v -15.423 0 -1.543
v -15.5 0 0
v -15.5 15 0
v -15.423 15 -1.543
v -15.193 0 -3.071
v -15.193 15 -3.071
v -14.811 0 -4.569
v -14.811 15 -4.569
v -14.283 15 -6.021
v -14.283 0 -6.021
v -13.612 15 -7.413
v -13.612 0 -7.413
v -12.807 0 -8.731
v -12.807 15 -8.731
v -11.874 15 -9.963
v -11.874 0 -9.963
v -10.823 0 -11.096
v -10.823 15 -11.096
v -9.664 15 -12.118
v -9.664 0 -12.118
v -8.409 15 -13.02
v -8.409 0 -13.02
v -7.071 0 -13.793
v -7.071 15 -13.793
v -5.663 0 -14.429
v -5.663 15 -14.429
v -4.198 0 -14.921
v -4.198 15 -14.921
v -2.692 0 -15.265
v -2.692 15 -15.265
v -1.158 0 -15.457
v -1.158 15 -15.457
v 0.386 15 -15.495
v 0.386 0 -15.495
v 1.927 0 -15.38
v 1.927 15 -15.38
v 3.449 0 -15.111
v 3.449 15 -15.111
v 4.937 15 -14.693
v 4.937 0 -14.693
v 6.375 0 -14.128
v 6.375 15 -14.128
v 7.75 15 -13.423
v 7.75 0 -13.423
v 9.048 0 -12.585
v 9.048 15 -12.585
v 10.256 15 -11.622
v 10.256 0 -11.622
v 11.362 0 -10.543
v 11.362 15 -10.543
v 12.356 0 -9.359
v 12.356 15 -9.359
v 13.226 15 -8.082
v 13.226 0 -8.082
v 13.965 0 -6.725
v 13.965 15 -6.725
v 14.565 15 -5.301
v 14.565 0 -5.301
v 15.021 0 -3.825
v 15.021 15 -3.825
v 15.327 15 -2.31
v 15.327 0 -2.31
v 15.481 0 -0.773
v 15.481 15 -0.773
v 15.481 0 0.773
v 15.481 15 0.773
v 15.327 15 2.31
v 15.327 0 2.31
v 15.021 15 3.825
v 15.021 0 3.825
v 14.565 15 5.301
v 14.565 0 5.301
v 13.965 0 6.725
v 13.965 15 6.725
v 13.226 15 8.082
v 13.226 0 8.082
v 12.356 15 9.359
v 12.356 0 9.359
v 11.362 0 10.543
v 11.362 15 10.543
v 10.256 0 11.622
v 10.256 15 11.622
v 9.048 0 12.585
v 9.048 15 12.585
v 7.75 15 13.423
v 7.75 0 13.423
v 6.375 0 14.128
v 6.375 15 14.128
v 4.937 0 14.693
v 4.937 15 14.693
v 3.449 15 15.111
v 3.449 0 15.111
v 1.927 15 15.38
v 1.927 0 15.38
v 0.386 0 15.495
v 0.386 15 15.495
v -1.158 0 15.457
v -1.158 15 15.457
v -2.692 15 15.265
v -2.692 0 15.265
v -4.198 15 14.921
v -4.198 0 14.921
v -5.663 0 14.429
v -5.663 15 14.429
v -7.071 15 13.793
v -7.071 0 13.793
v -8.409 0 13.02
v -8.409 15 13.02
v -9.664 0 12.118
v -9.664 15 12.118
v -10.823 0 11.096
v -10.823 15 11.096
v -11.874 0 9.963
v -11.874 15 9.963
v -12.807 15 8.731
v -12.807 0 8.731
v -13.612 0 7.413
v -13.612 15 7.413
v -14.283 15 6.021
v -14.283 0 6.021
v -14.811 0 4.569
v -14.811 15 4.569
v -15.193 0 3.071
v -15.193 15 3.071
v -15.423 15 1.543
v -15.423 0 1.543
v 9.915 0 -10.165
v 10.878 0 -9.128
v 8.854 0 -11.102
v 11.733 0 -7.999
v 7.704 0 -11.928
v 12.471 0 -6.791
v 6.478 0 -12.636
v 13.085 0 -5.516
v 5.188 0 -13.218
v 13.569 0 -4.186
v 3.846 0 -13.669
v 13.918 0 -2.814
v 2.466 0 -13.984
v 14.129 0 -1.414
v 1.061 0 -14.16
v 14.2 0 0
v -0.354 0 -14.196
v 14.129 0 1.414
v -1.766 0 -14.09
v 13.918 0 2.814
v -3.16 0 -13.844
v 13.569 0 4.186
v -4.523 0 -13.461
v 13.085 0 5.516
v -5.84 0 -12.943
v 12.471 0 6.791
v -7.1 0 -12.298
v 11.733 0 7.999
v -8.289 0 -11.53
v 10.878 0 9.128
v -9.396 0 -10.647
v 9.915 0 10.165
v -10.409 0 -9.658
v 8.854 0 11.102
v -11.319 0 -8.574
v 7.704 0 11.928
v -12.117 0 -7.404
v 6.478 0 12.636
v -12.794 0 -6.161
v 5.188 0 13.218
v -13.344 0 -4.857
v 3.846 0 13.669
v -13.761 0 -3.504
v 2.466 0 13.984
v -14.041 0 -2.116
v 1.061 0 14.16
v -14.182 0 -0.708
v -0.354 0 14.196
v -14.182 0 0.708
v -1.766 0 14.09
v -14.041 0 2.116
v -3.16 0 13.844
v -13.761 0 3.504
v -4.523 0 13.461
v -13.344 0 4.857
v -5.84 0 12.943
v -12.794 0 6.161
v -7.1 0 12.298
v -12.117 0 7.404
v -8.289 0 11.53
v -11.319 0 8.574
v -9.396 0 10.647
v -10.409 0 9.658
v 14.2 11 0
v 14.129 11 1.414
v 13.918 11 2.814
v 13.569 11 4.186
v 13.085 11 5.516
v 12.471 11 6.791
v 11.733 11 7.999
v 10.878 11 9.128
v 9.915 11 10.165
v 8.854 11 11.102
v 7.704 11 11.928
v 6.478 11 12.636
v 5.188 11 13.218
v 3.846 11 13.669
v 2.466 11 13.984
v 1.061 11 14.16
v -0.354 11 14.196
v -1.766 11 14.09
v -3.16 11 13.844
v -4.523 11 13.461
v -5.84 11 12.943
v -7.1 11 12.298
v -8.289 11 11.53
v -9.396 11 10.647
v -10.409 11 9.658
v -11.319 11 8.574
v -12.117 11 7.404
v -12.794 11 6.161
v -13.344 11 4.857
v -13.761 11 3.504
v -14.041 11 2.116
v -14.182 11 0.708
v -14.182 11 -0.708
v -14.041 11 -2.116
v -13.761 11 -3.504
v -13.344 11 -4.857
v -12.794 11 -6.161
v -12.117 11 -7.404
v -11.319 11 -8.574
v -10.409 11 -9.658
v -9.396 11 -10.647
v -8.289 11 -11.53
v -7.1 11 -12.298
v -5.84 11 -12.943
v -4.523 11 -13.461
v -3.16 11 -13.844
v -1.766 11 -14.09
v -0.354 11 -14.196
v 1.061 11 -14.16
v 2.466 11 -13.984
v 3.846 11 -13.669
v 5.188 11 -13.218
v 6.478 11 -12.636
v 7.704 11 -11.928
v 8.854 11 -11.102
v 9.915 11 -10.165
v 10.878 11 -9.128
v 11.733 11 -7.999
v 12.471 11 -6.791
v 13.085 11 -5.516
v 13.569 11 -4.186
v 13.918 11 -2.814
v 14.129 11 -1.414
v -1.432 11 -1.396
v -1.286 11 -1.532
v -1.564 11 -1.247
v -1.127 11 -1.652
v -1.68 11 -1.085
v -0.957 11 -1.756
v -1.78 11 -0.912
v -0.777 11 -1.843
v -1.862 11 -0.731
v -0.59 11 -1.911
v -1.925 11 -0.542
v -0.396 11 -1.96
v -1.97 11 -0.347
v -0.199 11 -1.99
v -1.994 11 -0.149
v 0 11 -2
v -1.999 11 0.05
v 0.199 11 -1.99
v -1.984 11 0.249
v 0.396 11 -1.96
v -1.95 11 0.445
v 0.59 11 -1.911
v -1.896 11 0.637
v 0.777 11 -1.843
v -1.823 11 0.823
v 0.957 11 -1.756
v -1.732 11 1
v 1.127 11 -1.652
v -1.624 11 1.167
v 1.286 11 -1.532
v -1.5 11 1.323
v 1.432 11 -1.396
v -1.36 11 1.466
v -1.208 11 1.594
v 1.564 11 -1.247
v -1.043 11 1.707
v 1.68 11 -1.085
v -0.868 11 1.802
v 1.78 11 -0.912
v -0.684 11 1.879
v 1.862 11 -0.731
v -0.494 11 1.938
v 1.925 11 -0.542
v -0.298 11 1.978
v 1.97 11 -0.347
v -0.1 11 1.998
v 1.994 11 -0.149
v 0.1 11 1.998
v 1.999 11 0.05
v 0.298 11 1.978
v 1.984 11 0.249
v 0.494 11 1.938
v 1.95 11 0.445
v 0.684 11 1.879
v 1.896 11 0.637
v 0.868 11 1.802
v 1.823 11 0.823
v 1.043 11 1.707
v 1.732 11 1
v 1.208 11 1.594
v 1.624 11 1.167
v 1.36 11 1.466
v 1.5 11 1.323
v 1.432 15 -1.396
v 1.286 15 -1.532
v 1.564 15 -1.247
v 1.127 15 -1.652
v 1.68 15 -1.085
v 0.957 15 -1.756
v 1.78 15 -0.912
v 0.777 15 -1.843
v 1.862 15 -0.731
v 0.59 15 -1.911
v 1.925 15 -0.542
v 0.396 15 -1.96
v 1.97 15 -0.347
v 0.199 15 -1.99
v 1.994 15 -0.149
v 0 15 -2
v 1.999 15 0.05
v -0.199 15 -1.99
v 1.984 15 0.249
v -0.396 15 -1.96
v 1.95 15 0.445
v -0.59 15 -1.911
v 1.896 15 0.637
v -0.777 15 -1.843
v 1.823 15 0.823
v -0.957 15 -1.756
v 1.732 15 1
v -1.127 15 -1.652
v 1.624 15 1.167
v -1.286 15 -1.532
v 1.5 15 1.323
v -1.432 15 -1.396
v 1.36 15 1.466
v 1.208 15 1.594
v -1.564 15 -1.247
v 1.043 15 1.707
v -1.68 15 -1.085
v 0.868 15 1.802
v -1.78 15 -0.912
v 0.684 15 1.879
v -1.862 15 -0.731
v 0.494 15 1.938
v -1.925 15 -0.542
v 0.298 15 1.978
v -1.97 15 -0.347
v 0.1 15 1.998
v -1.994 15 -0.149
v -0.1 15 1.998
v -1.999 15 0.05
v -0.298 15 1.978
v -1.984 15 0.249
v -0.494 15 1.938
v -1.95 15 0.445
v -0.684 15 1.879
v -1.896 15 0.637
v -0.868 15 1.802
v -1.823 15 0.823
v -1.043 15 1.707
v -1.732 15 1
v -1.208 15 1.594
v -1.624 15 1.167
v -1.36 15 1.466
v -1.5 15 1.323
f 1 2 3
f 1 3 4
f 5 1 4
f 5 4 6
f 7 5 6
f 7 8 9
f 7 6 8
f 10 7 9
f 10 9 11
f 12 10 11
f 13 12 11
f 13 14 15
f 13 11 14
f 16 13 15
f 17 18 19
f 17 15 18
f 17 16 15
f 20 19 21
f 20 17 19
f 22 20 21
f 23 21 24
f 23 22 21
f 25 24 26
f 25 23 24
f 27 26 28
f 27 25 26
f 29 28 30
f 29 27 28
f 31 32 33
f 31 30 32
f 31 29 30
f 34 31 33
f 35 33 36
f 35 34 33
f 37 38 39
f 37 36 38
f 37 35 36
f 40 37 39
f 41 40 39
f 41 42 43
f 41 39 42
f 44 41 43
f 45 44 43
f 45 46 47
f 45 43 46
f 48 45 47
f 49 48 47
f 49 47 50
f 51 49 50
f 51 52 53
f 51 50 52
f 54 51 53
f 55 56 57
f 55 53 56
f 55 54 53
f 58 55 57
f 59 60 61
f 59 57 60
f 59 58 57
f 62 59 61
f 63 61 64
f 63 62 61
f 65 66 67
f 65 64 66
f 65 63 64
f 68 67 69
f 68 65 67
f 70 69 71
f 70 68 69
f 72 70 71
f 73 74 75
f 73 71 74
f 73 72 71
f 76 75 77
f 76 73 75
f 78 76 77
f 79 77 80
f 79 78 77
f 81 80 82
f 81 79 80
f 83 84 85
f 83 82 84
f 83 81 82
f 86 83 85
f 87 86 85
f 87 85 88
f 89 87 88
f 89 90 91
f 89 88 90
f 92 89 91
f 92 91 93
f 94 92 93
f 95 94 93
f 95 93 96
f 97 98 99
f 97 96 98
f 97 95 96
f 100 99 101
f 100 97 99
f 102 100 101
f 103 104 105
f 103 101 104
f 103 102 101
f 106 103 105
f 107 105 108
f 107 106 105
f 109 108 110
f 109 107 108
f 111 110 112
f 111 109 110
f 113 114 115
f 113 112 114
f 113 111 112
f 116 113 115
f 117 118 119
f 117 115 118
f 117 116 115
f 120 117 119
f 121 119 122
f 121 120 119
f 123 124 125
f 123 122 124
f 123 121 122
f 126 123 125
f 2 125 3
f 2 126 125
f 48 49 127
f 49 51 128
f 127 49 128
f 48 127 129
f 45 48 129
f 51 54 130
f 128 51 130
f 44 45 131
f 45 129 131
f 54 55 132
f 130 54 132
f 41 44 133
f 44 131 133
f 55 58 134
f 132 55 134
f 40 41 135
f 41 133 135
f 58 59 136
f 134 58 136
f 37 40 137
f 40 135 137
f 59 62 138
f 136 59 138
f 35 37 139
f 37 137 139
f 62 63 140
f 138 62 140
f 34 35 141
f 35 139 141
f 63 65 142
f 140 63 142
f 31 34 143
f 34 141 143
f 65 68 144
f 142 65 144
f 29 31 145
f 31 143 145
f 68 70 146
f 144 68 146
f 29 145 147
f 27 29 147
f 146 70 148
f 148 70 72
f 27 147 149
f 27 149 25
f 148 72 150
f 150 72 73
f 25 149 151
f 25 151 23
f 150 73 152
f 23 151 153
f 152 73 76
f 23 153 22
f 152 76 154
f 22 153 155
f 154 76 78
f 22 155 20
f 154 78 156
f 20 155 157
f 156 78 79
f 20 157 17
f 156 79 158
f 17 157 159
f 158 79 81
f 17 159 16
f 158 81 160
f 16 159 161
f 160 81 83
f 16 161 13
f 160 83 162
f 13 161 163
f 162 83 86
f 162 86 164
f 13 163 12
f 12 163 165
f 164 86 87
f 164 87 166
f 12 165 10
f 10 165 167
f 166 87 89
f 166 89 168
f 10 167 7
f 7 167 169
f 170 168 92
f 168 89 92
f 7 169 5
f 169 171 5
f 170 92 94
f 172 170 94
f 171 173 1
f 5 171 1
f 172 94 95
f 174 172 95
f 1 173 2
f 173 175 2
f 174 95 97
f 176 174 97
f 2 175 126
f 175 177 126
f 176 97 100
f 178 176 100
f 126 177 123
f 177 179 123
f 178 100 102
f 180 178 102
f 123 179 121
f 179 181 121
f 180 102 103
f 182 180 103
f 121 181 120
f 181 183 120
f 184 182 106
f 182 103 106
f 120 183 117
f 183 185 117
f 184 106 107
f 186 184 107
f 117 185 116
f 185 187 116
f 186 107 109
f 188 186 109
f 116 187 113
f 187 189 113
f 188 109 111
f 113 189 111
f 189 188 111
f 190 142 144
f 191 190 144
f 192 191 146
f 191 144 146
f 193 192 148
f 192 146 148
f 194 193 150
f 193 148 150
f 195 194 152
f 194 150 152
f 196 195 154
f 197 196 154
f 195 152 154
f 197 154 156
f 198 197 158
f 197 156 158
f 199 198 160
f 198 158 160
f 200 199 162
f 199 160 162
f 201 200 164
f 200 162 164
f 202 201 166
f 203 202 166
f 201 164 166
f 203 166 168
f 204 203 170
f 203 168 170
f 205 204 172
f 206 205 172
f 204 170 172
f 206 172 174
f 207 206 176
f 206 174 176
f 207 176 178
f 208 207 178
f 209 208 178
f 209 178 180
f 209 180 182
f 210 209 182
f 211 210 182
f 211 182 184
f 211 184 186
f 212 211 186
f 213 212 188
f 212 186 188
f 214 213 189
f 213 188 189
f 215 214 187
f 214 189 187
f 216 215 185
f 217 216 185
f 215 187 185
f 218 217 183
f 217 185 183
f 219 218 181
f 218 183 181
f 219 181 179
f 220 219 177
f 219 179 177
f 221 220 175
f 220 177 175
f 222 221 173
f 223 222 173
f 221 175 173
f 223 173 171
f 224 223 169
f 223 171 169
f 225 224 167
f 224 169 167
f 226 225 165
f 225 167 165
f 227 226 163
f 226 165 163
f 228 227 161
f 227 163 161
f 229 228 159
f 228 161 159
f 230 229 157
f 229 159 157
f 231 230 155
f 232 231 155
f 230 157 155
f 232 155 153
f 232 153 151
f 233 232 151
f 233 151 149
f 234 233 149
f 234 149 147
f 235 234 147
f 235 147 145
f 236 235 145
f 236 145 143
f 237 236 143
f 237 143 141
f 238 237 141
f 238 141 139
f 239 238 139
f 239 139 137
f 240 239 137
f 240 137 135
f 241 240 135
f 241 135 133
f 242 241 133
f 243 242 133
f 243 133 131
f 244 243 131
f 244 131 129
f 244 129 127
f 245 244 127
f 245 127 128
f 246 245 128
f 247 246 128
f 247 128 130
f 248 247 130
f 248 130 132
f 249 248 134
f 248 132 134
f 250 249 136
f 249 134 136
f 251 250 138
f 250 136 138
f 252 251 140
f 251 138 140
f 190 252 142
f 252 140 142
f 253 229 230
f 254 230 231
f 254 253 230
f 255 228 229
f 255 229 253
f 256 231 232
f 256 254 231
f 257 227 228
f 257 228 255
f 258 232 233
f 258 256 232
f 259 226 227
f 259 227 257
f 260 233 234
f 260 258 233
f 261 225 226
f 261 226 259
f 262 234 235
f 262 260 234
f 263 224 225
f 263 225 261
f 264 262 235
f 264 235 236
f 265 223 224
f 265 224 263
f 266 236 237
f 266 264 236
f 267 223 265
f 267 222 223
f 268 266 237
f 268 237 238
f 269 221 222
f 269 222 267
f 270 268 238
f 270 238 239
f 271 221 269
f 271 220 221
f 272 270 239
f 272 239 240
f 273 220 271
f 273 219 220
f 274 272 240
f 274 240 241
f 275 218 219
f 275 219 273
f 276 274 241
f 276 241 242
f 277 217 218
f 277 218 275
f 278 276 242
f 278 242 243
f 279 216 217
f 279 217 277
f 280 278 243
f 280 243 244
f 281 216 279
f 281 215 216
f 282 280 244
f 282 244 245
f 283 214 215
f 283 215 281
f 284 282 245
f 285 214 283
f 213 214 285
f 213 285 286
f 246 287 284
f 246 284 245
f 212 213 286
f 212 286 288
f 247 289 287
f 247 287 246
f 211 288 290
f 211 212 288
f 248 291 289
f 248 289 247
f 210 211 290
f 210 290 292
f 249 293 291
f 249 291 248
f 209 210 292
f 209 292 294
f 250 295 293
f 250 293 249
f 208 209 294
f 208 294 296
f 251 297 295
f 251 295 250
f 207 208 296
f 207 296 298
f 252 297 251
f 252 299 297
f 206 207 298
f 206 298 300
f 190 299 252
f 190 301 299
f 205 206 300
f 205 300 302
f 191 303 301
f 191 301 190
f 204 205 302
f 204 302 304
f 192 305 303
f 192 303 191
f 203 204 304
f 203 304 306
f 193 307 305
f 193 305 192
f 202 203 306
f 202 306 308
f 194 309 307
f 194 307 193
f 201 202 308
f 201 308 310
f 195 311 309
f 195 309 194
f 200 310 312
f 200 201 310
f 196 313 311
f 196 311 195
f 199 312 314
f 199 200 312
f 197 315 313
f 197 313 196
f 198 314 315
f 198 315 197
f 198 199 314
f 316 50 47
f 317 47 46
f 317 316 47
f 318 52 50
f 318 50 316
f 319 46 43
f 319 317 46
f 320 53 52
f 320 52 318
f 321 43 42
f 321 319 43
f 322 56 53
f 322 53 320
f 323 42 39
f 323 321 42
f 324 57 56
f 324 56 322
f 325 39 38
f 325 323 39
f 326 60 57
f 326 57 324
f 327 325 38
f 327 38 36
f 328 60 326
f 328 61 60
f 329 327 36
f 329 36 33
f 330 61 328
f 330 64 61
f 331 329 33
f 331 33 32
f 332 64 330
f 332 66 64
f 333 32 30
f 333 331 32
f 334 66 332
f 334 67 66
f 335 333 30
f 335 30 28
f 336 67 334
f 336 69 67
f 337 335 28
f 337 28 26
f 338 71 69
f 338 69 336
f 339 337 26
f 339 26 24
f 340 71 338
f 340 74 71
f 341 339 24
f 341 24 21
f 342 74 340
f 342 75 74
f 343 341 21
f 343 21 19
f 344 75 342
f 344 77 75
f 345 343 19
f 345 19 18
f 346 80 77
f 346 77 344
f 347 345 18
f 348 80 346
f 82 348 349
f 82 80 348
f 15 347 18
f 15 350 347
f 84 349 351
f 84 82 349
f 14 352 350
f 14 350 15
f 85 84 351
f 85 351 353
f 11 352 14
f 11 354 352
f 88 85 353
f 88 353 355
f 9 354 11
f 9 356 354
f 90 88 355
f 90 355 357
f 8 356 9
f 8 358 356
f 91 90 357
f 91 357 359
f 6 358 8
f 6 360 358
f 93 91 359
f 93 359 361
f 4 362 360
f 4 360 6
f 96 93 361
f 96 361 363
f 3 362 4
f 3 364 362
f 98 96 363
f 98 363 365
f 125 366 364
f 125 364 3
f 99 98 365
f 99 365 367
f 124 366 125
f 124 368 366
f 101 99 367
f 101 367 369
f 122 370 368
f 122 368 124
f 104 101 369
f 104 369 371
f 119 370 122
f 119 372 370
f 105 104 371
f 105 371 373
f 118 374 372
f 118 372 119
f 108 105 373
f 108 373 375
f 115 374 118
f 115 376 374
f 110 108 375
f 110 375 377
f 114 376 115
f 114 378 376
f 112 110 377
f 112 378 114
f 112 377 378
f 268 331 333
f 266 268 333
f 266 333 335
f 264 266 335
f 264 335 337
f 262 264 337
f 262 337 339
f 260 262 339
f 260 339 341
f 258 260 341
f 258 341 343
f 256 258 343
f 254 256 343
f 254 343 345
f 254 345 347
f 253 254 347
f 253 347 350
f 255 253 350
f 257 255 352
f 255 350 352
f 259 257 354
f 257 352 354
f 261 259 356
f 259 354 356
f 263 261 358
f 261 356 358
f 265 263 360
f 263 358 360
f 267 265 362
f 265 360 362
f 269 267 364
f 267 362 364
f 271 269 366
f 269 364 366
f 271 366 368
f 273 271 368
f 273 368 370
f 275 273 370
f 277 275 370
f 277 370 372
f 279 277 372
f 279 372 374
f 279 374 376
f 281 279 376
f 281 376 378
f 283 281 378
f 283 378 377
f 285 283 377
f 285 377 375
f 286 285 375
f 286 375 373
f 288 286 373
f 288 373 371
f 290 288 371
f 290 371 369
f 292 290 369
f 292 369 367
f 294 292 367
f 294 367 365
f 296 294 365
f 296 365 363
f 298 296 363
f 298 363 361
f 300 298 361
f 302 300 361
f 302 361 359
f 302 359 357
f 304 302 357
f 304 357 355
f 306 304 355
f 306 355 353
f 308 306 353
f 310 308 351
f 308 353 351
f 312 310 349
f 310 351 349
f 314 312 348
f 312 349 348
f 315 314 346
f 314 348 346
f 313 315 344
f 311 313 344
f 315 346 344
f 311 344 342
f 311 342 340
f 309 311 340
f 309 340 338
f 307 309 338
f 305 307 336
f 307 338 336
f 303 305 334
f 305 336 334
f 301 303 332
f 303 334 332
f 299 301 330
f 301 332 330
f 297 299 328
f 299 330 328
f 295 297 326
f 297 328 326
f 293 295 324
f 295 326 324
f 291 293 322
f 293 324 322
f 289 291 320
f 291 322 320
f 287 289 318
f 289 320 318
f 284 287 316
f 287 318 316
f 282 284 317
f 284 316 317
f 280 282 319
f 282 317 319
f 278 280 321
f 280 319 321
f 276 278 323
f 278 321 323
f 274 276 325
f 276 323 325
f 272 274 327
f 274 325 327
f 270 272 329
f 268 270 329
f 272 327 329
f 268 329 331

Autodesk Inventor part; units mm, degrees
ref_plane "YZ Plane" through (0, 0, 0) normal (1, 0, 0) x (0, 1, 0)
ref_plane "XZ Plane" through (0, 0, 0) normal (0, 1, 0) x (-1, 0, 0)
ref_plane "XY Plane" through (0, 0, 0) normal (0, 0, 1) x (1, 0, 0)
sketch "Sketch1" plane through (0, 0, 0) normal (0, 1, 0) x (-1, 0, 0)
  circle A0 centre (0, 0) radius 15.5
  dimension "d0" = 31
extrude "Extrusion1" add sketch "Sketch1" along normal blind 15
sketch "Sketch2" plane through (0, 0, 0) normal (0, -1, 0) x (1, 0, 0)
  circle A0 centre (0, 0) radius 14.2
  dimension "d3" = 28.4
extrude "Extrusion2" cut sketch "Sketch2" against normal blind 11
sketch "Sketch4" plane through (0, 11, 0) normal (0, -1, 0) x (1, 0, 0)
  point P0 (0, 0)
hole "Hole1" at (0, 11, 0) direction (0, 1, 0) diameter 4 depth 4 tip angle 118
properties part number "_3DPrint"
